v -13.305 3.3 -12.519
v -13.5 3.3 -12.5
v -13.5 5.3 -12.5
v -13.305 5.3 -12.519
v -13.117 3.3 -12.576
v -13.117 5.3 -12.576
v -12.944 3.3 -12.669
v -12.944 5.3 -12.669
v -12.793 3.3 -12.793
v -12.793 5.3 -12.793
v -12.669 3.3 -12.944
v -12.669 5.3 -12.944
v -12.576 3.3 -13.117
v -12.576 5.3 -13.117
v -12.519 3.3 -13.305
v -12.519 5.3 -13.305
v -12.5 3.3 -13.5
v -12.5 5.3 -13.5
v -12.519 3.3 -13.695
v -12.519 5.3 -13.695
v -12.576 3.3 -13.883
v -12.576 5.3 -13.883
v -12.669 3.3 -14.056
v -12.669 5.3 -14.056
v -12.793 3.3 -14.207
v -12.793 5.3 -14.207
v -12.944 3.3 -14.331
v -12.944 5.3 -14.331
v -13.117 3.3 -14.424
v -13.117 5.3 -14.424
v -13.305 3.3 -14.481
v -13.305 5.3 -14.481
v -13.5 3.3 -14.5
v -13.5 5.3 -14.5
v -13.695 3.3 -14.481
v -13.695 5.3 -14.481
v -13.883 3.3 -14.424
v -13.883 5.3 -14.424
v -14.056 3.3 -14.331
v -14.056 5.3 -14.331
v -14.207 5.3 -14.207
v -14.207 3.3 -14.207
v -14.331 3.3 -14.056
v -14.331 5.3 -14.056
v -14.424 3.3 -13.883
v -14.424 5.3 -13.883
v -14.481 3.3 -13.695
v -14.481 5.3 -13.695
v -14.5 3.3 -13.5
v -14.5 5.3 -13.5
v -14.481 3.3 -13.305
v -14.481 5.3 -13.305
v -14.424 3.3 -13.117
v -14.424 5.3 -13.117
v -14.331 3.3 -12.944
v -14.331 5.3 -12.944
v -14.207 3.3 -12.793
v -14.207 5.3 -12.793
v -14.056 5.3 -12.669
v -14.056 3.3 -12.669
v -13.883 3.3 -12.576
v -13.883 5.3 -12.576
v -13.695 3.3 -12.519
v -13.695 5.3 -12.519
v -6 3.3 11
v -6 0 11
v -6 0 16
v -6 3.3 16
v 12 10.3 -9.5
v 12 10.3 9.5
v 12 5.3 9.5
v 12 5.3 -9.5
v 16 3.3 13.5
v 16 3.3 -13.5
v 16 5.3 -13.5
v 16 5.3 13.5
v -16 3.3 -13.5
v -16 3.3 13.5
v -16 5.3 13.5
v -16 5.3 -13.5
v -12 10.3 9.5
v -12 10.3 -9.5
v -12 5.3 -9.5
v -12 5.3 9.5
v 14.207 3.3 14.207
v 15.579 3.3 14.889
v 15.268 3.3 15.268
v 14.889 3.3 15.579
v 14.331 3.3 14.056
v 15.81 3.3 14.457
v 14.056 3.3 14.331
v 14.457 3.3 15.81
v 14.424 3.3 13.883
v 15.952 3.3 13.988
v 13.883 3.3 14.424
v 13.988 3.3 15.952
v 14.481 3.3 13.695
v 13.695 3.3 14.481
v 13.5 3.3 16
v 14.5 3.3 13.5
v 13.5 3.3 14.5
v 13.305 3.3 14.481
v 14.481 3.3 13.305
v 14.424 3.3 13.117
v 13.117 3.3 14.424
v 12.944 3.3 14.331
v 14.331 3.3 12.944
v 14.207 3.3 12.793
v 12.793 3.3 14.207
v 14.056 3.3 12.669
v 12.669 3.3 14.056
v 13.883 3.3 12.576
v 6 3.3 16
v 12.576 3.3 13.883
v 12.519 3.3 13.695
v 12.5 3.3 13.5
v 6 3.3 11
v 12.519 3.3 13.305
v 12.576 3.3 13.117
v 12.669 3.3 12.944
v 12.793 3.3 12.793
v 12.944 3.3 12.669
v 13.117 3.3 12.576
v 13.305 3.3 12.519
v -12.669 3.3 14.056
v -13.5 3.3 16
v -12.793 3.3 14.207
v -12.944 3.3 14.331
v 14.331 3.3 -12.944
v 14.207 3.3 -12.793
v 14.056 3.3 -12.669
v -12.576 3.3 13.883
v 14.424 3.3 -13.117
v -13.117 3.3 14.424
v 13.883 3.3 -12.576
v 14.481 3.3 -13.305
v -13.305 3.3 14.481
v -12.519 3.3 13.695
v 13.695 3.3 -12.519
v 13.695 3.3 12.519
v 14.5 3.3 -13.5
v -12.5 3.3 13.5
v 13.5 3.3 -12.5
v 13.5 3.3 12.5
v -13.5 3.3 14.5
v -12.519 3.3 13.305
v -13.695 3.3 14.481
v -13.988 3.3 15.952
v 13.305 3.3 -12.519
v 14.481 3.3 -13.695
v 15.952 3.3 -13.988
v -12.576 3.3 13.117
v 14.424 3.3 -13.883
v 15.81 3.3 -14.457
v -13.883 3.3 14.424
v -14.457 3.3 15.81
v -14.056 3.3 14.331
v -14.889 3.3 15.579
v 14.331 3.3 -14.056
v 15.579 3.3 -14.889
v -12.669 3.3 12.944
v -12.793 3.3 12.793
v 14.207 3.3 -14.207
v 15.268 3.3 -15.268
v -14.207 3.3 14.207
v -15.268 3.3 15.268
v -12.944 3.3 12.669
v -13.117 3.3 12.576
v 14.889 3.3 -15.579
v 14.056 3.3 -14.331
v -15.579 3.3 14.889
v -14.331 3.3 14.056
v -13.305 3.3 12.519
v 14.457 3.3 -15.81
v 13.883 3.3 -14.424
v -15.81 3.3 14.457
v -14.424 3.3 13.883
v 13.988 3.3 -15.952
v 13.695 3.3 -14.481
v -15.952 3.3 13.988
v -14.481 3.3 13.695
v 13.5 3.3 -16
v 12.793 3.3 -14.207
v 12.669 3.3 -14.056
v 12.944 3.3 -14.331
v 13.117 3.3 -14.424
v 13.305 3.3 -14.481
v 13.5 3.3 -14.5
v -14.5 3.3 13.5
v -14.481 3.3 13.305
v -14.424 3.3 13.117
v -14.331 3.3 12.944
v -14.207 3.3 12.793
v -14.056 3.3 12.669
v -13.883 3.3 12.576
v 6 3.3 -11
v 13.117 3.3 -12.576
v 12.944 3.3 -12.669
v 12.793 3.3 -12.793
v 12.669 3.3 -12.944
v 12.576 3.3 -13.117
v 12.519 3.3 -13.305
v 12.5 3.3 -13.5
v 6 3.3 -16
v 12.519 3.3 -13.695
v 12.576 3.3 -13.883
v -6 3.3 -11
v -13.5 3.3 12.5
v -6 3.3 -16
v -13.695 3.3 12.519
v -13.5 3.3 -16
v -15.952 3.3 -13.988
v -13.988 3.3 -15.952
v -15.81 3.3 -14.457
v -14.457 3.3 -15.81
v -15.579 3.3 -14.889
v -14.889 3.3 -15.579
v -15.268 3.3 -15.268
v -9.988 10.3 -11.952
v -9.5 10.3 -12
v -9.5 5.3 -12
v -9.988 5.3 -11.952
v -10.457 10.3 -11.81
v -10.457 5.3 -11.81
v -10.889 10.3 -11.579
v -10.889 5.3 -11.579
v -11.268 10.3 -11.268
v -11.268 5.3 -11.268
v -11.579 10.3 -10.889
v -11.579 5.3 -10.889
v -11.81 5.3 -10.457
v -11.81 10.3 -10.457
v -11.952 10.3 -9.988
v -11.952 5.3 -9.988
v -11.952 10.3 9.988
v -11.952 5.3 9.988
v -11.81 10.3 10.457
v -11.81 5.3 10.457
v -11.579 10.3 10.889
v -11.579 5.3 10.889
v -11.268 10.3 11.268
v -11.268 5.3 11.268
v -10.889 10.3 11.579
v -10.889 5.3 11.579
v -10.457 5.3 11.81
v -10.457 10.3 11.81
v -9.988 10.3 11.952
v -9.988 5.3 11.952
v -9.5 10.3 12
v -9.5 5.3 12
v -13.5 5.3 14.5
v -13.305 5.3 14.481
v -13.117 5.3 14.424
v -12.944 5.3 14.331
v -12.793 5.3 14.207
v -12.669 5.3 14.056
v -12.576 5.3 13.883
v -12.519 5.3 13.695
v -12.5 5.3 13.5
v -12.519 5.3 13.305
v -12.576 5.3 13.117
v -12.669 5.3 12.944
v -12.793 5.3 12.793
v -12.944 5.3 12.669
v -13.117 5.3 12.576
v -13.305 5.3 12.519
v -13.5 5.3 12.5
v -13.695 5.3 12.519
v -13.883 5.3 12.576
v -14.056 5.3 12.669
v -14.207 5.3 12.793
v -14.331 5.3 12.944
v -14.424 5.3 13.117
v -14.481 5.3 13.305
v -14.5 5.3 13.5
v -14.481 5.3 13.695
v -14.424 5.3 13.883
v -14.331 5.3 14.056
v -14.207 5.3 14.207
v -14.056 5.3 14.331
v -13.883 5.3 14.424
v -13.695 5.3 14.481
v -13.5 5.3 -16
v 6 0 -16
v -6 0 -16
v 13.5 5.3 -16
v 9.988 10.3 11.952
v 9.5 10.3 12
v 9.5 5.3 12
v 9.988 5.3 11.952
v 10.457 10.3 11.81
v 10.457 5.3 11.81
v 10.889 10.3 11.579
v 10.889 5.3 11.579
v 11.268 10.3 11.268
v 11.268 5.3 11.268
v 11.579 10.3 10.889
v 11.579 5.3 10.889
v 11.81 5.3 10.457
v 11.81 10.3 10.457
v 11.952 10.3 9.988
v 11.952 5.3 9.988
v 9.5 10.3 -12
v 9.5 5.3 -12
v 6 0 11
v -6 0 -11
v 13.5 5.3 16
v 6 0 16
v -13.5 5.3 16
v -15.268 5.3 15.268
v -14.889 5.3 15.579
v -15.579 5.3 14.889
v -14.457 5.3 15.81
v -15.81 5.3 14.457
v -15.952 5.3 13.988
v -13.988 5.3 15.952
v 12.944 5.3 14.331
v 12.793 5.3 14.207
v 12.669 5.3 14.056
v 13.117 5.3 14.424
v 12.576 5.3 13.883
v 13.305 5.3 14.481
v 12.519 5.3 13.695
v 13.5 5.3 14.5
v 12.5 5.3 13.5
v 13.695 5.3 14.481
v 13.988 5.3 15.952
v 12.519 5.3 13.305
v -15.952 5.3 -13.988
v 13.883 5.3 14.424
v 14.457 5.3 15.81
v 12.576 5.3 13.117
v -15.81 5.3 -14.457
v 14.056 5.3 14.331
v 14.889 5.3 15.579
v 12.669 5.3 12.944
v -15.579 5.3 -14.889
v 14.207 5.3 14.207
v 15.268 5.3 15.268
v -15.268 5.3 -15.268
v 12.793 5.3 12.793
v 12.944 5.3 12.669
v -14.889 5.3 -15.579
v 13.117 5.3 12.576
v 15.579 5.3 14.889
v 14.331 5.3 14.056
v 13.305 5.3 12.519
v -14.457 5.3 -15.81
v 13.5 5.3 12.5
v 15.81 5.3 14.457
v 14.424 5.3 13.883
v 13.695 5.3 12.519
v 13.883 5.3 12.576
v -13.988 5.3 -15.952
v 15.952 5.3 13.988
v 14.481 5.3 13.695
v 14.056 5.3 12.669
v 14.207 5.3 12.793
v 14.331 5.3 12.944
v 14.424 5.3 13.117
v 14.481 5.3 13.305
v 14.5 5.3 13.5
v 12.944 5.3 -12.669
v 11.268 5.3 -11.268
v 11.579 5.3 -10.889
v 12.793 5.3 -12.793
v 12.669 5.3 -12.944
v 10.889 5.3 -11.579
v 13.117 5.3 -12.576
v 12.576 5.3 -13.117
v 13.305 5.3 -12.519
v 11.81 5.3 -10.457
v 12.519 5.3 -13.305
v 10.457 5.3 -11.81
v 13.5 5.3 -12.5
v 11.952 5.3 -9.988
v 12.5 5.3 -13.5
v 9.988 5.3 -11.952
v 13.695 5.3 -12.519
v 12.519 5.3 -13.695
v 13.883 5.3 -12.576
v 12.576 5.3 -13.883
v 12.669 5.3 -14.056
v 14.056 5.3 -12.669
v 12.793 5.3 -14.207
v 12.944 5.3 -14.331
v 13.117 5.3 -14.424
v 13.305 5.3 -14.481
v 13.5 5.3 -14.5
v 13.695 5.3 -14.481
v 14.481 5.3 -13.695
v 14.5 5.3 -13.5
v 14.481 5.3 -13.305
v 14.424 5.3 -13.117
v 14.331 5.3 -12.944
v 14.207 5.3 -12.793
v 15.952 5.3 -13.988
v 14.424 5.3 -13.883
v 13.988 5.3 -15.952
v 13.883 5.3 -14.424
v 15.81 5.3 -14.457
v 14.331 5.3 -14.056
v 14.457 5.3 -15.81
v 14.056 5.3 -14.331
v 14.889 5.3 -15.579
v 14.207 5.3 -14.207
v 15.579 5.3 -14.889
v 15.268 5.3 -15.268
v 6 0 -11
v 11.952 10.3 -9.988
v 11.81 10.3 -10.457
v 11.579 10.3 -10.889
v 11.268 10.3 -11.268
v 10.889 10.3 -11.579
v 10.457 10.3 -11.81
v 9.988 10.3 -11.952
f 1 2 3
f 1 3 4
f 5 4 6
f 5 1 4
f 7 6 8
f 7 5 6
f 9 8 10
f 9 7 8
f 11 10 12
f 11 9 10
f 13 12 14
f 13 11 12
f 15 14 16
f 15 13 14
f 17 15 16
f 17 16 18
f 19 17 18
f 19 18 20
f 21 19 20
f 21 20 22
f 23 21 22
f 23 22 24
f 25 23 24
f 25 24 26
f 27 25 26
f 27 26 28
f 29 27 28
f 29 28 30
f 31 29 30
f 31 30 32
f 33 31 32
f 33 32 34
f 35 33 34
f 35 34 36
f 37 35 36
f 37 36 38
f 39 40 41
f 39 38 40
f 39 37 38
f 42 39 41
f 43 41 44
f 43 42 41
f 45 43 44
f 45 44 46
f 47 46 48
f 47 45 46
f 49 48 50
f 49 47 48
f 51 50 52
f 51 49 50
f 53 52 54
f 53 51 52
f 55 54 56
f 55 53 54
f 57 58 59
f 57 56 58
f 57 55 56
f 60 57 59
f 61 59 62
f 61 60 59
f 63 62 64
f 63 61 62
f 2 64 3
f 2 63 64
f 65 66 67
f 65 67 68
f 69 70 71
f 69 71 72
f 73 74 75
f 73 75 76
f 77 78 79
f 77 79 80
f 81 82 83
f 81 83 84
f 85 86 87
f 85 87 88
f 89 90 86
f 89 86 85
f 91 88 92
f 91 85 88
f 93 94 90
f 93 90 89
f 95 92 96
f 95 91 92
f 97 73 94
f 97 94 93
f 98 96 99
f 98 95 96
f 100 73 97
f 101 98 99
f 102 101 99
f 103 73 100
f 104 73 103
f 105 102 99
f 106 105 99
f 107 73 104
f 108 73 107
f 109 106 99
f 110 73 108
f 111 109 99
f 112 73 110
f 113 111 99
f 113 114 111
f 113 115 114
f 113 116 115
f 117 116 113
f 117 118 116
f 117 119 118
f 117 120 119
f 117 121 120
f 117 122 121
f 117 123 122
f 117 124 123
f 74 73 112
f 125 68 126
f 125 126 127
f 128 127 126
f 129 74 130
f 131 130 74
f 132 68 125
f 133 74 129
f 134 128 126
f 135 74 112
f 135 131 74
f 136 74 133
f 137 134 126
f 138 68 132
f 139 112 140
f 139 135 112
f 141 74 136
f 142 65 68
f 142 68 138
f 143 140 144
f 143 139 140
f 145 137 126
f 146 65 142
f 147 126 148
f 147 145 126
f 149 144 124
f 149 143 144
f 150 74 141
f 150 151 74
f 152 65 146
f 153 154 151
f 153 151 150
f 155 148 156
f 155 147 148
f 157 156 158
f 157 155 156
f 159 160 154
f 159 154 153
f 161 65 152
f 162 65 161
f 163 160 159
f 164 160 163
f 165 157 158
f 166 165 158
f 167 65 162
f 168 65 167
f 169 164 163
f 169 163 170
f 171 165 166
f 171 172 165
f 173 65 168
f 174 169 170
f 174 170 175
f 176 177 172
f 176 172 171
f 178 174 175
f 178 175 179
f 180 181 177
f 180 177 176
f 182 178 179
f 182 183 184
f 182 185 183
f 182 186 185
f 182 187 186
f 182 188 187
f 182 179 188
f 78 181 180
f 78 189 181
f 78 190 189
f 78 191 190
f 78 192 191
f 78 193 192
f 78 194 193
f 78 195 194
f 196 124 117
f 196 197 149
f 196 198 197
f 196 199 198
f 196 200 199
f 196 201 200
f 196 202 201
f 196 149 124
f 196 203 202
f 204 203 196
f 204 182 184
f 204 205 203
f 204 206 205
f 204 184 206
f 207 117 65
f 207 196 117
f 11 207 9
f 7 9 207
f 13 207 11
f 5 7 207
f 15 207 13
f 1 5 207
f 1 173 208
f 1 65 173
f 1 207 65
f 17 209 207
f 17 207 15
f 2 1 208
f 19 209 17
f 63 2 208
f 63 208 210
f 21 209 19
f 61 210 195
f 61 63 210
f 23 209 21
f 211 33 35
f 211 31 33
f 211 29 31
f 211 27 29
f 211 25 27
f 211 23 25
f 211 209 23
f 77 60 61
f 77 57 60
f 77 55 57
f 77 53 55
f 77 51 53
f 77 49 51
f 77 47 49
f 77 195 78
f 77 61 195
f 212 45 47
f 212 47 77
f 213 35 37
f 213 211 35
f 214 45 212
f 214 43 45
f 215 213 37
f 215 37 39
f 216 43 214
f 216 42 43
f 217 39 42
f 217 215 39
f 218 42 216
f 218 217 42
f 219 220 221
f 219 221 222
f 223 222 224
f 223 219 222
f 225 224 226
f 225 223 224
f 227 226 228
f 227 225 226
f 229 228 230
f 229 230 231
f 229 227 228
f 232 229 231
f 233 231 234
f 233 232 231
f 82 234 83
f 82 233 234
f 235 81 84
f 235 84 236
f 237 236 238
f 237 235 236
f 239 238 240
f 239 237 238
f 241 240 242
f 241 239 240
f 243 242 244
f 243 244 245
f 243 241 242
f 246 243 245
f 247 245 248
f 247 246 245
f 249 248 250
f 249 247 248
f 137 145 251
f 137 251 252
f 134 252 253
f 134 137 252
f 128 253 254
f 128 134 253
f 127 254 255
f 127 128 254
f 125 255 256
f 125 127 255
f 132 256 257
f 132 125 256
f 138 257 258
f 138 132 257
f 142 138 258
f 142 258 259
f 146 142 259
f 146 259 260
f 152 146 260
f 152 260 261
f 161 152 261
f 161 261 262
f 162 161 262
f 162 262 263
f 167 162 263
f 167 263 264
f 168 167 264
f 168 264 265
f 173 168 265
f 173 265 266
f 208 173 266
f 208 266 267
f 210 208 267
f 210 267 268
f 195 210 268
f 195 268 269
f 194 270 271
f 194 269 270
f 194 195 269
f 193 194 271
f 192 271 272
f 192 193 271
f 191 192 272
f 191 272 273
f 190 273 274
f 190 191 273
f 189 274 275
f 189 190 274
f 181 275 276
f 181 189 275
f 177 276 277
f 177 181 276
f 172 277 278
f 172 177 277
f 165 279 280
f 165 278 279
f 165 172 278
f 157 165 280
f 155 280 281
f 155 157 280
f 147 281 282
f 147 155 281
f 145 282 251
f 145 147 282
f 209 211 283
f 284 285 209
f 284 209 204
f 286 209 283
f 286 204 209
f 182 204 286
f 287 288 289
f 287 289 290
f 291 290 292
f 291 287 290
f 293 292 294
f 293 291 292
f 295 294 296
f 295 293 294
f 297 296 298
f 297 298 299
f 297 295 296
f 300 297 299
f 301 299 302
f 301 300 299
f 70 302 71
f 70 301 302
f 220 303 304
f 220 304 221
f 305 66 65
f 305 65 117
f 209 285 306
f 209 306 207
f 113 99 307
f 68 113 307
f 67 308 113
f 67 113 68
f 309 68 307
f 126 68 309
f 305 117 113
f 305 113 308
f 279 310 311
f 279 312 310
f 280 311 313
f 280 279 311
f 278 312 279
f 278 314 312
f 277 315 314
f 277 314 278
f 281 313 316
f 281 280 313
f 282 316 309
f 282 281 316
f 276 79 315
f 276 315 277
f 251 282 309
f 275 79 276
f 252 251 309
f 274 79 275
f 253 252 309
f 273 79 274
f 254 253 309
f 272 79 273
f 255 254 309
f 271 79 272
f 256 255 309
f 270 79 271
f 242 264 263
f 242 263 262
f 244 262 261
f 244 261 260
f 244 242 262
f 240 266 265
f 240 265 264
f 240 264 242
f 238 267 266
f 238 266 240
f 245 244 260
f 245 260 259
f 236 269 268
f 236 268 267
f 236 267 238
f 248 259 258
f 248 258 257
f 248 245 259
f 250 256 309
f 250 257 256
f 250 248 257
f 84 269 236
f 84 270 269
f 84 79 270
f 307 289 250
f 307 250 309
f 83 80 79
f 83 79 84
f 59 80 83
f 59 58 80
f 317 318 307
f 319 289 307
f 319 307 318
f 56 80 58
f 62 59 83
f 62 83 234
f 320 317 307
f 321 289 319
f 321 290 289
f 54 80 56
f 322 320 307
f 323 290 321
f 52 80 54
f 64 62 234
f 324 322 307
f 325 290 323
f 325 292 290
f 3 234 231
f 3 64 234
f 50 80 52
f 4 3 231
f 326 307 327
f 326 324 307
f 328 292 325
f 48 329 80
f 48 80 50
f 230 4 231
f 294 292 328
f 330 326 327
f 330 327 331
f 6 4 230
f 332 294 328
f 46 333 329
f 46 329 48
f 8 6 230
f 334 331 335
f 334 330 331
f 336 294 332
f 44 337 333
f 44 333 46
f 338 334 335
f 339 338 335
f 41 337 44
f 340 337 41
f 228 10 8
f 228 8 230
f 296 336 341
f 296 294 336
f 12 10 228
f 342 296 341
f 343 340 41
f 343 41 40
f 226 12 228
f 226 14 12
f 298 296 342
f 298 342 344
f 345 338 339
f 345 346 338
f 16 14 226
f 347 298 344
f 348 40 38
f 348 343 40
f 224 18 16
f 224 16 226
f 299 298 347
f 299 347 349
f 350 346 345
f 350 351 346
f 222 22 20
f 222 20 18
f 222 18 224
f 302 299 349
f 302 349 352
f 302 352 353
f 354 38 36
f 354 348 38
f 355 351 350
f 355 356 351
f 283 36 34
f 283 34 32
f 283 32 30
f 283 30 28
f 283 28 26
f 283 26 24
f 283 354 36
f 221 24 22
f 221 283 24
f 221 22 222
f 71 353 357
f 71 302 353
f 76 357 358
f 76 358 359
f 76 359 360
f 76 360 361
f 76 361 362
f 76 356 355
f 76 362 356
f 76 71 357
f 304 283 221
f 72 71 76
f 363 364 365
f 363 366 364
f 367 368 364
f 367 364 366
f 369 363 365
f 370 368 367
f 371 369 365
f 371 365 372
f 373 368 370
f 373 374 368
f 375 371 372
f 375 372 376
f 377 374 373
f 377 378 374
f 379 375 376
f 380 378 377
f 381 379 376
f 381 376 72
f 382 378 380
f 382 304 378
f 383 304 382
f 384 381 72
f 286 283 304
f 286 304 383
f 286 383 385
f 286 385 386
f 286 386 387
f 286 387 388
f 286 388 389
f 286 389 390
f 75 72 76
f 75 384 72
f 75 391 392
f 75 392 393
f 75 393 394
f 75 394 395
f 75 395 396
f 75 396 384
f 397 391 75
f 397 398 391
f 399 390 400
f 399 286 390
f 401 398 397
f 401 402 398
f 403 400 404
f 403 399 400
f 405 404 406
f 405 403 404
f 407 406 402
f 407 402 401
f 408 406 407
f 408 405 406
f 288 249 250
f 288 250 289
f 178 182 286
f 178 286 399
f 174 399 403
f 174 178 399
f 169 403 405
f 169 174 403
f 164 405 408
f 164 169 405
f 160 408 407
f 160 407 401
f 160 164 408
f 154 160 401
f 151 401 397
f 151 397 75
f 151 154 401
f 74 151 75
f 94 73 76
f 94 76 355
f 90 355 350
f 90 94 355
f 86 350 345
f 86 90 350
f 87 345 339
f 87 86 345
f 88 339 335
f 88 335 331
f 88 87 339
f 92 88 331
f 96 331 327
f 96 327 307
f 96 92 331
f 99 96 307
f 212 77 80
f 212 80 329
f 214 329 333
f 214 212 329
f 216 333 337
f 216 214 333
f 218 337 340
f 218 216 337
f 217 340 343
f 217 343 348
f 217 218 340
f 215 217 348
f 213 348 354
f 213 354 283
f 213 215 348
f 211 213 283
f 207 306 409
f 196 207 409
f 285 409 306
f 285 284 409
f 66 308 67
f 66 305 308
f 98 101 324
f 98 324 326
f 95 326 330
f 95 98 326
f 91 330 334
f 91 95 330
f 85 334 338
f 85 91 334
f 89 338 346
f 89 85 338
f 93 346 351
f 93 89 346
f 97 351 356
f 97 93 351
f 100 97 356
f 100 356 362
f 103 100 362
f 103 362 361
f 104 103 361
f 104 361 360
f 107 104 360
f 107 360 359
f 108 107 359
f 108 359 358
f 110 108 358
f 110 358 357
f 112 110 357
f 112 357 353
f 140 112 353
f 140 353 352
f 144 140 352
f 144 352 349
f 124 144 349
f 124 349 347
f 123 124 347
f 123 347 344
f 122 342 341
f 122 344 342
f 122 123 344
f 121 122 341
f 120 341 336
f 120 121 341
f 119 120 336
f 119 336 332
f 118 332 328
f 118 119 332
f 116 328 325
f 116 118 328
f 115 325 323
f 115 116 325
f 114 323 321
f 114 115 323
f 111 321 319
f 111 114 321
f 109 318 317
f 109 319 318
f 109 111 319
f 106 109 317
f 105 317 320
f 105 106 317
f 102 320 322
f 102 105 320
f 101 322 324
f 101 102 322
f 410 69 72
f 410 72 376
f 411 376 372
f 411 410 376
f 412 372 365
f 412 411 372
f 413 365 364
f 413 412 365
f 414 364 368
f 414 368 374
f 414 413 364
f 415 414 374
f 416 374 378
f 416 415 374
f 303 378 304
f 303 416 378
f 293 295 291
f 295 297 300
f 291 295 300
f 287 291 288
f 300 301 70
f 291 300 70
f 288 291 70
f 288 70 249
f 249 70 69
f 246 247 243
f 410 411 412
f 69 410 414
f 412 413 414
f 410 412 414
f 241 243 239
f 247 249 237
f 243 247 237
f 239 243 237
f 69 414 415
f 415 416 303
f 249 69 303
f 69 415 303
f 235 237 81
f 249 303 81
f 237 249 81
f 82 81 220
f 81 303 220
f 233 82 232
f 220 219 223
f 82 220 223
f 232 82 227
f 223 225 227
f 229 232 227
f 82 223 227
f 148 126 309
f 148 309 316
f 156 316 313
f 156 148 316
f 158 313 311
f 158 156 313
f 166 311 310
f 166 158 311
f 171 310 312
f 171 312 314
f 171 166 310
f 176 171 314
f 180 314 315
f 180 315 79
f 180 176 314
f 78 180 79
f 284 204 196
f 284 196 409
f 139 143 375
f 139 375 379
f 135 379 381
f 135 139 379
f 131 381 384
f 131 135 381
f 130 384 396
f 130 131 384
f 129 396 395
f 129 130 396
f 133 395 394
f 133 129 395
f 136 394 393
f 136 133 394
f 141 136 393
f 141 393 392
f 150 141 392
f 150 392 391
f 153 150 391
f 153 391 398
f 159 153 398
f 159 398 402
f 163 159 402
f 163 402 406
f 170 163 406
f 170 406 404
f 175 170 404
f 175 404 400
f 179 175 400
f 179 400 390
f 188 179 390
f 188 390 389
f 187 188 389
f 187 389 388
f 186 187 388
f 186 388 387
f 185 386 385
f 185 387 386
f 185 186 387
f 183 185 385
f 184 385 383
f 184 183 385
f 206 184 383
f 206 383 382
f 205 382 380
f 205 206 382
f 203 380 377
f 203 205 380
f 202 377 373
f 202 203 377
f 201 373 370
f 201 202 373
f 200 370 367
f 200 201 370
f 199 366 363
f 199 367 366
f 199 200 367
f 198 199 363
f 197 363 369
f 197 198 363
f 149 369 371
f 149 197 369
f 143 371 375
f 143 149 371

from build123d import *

# Parameters (mm, degrees)
BOSS_EXTRUDE1_DEPTH     = 10.3
SKETCH2_OUTSIDE_W       = 43.282
SKETCH2_OUTSIDE_H       = 43.282
CUT_EXTRUDE1_DEPTH      = 5
CUT_EXTRUDE2_DEPTH      = 24.239836488
CUT_EXTRUDE2_DEPTH_BACK = 24.239836488
SKETCH4_R               = 1
CUT_EXTRUDE3_DEPTH      = 38.230229653
CUT_EXTRUDE3_DEPTH_BACK = 38.230229653
SKETCH6_W               = 12
SKETCH6_H               = 22
CUT_EXTRUDE4_DEPTH      = 3.3


with BuildPart() as part:
    # Sketch1 → Boss-Extrude1 (new body)
    with BuildSketch(Plane(origin=(0, 0, 0), x_dir=(1, 0, 0), z_dir=(0, 1, 0))):
        with BuildLine():
            Line((-13.5, 16), (13.5, 16))
            ThreePointArc((13.5, 16), (15.267766953, 15.267766953), (16, 13.5))
            Line((16, 13.5), (16, -13.5))
            ThreePointArc((16, -13.5), (15.267766953, -15.267766953), (13.5, -16))
            Line((13.5, -16), (-13.5, -16))
            ThreePointArc((-13.5, -16), (-15.267766953, -15.267766953), (-16, -13.5))
            Line((-16, -13.5), (-16, 13.5))
            ThreePointArc((-16, 13.5), (-15.267766953, 15.267766953), (-13.5, 16))
        make_face()
    extrude(amount=BOSS_EXTRUDE1_DEPTH)

    # Sketch2 outside → Cut-Extrude1 (cut)
    with BuildSketch(Plane(origin=(0, 10.3, 0), x_dir=(1, 0, 0), z_dir=(0, 1, 0))):
        Rectangle(SKETCH2_OUTSIDE_W, SKETCH2_OUTSIDE_H)
        with BuildLine():
            Line((-9.5, -12), (9.5, -12))
            ThreePointArc((9.5, -12), (11.267766953, -11.267766953), (12, -9.5))
            Line((12, -9.5), (12, 9.5))
            ThreePointArc((12, 9.5), (11.267766953, 11.267766953), (9.5, 12))
            Line((9.5, 12), (-9.5, 12))
            ThreePointArc((-9.5, 12), (-11.267766953, 11.267766953), (-12, 9.5))
            Line((-12, 9.5), (-12, -9.5))
            ThreePointArc((-12, -9.5), (-11.267766953, -11.267766953), (-9.5, -12))
        make_face(mode=Mode.SUBTRACT)
    extrude(amount=-CUT_EXTRUDE1_DEPTH, mode=Mode.SUBTRACT)

    # Sketch4 → Cut-Extrude2 (cut, two sides: drawn at the far end of the back side and taken through both)
    with BuildSketch(Plane(origin=(0, 5.3, 0), x_dir=(1, 0, 0), z_dir=(0, 1, 0)).offset(-CUT_EXTRUDE2_DEPTH_BACK)):
        with Locations(Location((-13.5, 13.5, 0), (0, 0, 270))):
            Circle(SKETCH4_R)
        with Locations(Location((13.5, -13.5, 0), (0, 0, 270))):
            Circle(SKETCH4_R)
        with Locations(Location((-13.5, -13.5, 0), (0, 0, 270))):
            Circle(SKETCH4_R)
        with Locations(Location((13.5, 13.5, 0), (0, 0, 270))):
            Circle(SKETCH4_R)
    extrude(amount=CUT_EXTRUDE2_DEPTH + CUT_EXTRUDE2_DEPTH_BACK, mode=Mode.SUBTRACT)

    # Sketch5 → Cut-Extrude3 (cut, two sides: drawn at the far end of the back side and taken through both)
    with BuildSketch(Plane.XY.offset(16).offset(-CUT_EXTRUDE3_DEPTH_BACK)):
        Polygon((-17.244345891, 3.3), (-17.244345891, -0.614628683), (-6, -0.614628683), (-6, 0), (-6, 0.3), (-6, 3.3), align=None)
        Polygon((6, 3.3), (6, 0.3), (6, 0), (6, -0.614628683), (18.655939846, -0.614628683), (18.655939846, 3.3), align=None)
    extrude(amount=CUT_EXTRUDE3_DEPTH + CUT_EXTRUDE3_DEPTH_BACK, mode=Mode.SUBTRACT)

    # Sketch6 → Cut-Extrude4 (cut)
    with BuildSketch(Plane.XZ):
        Rectangle(SKETCH6_W, SKETCH6_H)
    extrude(amount=-CUT_EXTRUDE4_DEPTH, mode=Mode.SUBTRACT)


solid = part.part
